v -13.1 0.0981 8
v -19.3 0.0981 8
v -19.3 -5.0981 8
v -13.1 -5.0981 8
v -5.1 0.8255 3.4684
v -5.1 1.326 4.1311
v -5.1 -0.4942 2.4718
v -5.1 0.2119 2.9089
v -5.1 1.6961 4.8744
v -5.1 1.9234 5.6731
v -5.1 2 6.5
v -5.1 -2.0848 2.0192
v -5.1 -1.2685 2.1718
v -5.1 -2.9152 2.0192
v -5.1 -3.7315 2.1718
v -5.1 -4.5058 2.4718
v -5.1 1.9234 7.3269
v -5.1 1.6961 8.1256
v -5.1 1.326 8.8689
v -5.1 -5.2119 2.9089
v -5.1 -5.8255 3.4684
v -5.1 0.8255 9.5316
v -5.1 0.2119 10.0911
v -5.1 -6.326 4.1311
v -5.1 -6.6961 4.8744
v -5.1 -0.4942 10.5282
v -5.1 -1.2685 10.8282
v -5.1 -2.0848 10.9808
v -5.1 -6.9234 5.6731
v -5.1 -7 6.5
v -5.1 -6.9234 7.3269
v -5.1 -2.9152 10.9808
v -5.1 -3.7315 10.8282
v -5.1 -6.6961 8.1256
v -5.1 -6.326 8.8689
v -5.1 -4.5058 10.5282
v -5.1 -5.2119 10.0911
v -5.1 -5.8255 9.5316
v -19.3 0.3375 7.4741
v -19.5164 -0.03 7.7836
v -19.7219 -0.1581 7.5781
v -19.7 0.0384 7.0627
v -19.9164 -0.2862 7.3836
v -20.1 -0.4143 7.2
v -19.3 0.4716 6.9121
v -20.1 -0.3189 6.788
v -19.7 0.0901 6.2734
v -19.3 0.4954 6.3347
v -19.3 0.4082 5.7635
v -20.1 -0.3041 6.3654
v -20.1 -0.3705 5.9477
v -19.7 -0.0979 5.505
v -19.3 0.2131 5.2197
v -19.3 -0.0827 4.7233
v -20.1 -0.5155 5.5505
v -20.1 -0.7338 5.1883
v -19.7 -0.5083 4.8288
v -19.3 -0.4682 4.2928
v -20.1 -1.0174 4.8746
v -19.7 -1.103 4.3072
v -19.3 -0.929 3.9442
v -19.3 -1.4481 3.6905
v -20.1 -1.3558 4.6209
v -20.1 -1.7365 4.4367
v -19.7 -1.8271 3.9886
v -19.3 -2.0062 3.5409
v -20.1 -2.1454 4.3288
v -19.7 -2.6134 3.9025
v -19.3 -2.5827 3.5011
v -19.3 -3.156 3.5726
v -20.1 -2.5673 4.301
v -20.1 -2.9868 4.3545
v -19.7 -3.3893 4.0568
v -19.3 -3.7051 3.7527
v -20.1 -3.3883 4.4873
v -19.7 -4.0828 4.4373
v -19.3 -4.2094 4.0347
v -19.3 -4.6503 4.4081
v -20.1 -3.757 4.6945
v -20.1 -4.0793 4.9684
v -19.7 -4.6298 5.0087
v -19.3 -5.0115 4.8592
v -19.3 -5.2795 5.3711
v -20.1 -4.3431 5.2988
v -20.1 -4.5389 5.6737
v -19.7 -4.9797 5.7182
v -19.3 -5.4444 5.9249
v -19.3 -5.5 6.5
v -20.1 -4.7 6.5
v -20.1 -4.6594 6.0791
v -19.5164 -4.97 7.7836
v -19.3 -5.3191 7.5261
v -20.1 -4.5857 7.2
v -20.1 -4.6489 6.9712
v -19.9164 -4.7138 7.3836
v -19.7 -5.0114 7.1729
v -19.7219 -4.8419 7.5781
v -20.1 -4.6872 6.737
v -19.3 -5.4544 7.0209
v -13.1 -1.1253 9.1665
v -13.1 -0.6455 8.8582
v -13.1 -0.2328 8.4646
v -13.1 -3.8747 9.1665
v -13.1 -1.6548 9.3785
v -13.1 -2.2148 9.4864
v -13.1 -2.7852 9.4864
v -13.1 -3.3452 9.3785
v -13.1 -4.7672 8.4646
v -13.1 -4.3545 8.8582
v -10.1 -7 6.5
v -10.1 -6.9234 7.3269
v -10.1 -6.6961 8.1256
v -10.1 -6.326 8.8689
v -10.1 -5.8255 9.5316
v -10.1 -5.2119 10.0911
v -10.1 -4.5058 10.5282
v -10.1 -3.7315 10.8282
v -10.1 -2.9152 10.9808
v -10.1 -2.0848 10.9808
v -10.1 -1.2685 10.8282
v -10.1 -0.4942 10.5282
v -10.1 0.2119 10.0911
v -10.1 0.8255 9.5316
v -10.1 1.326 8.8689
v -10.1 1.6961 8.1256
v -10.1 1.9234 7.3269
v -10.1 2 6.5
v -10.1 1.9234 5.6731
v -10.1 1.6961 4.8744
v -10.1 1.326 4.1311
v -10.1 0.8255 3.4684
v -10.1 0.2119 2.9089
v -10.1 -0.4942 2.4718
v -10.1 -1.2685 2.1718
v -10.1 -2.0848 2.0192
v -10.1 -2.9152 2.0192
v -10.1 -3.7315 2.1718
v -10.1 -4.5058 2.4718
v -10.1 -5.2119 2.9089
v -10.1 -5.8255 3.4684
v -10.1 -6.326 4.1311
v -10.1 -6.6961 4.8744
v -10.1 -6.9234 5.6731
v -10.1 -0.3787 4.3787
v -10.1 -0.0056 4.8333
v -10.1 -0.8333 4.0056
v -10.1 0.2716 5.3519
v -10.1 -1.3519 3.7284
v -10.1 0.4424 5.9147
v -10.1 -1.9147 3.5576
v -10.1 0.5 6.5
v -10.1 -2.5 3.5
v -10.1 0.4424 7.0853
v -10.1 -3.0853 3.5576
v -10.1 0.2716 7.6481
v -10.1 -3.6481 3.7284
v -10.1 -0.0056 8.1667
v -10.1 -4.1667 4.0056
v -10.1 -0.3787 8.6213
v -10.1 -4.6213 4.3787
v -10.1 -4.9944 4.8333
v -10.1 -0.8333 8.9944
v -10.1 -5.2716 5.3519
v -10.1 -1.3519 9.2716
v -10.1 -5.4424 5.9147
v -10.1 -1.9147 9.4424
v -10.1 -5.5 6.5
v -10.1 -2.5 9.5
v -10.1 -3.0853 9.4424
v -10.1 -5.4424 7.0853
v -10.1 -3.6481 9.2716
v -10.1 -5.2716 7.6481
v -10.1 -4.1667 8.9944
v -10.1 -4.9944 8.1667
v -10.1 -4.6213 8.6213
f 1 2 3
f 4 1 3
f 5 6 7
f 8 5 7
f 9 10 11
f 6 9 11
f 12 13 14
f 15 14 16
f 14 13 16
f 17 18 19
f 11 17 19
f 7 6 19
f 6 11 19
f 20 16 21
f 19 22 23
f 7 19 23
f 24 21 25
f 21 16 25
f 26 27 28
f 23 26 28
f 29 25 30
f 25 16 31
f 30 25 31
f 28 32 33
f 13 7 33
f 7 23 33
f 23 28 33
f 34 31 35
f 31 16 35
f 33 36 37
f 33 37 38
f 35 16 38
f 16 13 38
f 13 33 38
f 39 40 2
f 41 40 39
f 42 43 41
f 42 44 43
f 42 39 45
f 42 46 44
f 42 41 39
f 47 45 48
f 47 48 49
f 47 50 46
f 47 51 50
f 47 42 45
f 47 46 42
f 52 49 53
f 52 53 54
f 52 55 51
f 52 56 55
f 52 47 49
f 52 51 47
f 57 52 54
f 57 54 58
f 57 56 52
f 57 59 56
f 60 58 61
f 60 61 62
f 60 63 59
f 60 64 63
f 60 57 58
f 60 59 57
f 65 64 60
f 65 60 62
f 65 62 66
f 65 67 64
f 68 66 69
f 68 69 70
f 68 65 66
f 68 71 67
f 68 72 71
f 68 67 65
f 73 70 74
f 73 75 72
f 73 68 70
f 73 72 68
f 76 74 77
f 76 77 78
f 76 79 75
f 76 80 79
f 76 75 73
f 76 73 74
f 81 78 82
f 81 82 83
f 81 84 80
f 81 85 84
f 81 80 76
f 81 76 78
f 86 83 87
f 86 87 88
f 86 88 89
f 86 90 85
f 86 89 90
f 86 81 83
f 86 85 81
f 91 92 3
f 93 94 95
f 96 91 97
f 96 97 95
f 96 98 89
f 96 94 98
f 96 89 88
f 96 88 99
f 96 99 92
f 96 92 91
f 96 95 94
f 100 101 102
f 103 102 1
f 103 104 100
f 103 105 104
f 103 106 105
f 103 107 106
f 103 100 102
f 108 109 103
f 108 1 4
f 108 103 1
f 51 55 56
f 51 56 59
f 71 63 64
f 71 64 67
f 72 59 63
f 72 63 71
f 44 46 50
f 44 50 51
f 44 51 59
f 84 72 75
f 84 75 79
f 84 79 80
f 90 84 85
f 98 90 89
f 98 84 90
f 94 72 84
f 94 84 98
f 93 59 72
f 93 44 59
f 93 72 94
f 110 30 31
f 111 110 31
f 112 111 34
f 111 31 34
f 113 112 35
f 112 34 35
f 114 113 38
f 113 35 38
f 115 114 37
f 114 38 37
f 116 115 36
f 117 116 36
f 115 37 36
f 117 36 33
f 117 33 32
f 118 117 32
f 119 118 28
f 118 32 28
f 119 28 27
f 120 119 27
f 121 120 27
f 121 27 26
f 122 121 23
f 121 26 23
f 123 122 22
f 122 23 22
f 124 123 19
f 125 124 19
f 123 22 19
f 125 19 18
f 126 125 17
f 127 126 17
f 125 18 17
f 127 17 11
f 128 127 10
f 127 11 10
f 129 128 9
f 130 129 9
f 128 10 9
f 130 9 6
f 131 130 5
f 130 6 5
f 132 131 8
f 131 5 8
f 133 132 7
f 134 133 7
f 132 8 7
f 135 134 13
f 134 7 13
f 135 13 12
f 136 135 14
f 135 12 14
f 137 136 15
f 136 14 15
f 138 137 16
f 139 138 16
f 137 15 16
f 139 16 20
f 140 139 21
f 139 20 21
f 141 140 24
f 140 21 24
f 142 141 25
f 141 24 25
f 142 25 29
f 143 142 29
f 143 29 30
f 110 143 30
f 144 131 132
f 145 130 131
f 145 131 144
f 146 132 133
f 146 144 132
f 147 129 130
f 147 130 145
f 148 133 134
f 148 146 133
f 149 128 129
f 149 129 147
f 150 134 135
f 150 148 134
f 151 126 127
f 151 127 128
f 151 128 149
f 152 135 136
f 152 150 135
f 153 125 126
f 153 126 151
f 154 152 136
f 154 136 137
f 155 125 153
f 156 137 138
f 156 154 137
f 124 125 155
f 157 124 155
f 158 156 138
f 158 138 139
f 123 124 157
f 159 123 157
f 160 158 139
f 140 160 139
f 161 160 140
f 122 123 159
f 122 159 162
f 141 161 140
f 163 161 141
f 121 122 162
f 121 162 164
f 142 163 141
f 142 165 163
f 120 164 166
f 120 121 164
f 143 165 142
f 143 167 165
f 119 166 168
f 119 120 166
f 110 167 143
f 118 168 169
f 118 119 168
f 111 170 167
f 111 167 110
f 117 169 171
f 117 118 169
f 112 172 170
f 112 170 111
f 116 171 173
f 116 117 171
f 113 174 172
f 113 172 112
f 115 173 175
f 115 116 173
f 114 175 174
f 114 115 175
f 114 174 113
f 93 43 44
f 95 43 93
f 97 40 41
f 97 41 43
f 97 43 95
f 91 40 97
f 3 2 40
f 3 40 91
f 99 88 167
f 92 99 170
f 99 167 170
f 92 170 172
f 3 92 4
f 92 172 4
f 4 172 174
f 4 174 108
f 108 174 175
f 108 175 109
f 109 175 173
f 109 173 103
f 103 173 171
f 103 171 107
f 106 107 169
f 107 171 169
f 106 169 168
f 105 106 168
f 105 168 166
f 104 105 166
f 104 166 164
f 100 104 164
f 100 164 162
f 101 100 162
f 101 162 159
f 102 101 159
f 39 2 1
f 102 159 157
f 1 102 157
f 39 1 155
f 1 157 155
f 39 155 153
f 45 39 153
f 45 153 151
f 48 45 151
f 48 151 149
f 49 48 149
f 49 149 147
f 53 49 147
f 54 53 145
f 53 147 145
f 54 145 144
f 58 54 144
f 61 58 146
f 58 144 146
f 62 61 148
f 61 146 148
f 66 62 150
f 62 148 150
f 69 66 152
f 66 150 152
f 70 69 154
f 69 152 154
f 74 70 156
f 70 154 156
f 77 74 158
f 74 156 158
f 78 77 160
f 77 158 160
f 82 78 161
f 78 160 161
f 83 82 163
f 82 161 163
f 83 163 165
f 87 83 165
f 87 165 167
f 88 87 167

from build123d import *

# Parameters (mm, degrees)
SKETCH001_R  = 4.5
PAD001_DEPTH = 5
SKETCH002_R  = 3
PAD002_DEPTH = 10
SKETCH003_W  = 9
SKETCH003_H  = 3
POCKET_DEPTH = 7
CHAMFER_SIZE = 0.8


with BuildPart() as part:
    # Sketch001 (on Face1 of ShapeBinder) → Pad001 (new body)
    with BuildSketch(Plane(origin=(-5.1, 0, 0), x_dir=(0, -1, 0), z_dir=(-1, 0, 0))):
        with Locations((2.5, 6.5)):
            Circle(SKETCH001_R)
    extrude(amount=PAD001_DEPTH)

    # Sketch002 (on Face3 of Pad001) → Pad002 (join)
    with BuildSketch(Plane(origin=(-10.1, 0, 0), x_dir=(0, -1, 0), z_dir=(-1, 0, 0))):
        with Locations((2.5, 6.5)):
            Circle(SKETCH002_R)
    extrude(amount=PAD002_DEPTH)

    # Sketch003 (on Face5 of Pad002) → Pocket (cut)
    with BuildSketch(Plane(origin=(-20.1, 0, 0), x_dir=(0, -1, 0), z_dir=(-1, 0, 0))):
        with Locations((2.5, 9.5)):
            Rectangle(SKETCH003_W, SKETCH003_H)
    extrude(amount=-POCKET_DEPTH, mode=Mode.SUBTRACT)

    # Chamfer
    chamfer_edges = [part.edges().sort_by_distance(p)[0] for p in [
        (-20.1, -5.397777, 7.276457),
        (-20.1, -2.5, 8),
        (-20.1, -1.723543, 3.602223),
    ]]
    chamfer(chamfer_edges, length=CHAMFER_SIZE)


solid = part.part
